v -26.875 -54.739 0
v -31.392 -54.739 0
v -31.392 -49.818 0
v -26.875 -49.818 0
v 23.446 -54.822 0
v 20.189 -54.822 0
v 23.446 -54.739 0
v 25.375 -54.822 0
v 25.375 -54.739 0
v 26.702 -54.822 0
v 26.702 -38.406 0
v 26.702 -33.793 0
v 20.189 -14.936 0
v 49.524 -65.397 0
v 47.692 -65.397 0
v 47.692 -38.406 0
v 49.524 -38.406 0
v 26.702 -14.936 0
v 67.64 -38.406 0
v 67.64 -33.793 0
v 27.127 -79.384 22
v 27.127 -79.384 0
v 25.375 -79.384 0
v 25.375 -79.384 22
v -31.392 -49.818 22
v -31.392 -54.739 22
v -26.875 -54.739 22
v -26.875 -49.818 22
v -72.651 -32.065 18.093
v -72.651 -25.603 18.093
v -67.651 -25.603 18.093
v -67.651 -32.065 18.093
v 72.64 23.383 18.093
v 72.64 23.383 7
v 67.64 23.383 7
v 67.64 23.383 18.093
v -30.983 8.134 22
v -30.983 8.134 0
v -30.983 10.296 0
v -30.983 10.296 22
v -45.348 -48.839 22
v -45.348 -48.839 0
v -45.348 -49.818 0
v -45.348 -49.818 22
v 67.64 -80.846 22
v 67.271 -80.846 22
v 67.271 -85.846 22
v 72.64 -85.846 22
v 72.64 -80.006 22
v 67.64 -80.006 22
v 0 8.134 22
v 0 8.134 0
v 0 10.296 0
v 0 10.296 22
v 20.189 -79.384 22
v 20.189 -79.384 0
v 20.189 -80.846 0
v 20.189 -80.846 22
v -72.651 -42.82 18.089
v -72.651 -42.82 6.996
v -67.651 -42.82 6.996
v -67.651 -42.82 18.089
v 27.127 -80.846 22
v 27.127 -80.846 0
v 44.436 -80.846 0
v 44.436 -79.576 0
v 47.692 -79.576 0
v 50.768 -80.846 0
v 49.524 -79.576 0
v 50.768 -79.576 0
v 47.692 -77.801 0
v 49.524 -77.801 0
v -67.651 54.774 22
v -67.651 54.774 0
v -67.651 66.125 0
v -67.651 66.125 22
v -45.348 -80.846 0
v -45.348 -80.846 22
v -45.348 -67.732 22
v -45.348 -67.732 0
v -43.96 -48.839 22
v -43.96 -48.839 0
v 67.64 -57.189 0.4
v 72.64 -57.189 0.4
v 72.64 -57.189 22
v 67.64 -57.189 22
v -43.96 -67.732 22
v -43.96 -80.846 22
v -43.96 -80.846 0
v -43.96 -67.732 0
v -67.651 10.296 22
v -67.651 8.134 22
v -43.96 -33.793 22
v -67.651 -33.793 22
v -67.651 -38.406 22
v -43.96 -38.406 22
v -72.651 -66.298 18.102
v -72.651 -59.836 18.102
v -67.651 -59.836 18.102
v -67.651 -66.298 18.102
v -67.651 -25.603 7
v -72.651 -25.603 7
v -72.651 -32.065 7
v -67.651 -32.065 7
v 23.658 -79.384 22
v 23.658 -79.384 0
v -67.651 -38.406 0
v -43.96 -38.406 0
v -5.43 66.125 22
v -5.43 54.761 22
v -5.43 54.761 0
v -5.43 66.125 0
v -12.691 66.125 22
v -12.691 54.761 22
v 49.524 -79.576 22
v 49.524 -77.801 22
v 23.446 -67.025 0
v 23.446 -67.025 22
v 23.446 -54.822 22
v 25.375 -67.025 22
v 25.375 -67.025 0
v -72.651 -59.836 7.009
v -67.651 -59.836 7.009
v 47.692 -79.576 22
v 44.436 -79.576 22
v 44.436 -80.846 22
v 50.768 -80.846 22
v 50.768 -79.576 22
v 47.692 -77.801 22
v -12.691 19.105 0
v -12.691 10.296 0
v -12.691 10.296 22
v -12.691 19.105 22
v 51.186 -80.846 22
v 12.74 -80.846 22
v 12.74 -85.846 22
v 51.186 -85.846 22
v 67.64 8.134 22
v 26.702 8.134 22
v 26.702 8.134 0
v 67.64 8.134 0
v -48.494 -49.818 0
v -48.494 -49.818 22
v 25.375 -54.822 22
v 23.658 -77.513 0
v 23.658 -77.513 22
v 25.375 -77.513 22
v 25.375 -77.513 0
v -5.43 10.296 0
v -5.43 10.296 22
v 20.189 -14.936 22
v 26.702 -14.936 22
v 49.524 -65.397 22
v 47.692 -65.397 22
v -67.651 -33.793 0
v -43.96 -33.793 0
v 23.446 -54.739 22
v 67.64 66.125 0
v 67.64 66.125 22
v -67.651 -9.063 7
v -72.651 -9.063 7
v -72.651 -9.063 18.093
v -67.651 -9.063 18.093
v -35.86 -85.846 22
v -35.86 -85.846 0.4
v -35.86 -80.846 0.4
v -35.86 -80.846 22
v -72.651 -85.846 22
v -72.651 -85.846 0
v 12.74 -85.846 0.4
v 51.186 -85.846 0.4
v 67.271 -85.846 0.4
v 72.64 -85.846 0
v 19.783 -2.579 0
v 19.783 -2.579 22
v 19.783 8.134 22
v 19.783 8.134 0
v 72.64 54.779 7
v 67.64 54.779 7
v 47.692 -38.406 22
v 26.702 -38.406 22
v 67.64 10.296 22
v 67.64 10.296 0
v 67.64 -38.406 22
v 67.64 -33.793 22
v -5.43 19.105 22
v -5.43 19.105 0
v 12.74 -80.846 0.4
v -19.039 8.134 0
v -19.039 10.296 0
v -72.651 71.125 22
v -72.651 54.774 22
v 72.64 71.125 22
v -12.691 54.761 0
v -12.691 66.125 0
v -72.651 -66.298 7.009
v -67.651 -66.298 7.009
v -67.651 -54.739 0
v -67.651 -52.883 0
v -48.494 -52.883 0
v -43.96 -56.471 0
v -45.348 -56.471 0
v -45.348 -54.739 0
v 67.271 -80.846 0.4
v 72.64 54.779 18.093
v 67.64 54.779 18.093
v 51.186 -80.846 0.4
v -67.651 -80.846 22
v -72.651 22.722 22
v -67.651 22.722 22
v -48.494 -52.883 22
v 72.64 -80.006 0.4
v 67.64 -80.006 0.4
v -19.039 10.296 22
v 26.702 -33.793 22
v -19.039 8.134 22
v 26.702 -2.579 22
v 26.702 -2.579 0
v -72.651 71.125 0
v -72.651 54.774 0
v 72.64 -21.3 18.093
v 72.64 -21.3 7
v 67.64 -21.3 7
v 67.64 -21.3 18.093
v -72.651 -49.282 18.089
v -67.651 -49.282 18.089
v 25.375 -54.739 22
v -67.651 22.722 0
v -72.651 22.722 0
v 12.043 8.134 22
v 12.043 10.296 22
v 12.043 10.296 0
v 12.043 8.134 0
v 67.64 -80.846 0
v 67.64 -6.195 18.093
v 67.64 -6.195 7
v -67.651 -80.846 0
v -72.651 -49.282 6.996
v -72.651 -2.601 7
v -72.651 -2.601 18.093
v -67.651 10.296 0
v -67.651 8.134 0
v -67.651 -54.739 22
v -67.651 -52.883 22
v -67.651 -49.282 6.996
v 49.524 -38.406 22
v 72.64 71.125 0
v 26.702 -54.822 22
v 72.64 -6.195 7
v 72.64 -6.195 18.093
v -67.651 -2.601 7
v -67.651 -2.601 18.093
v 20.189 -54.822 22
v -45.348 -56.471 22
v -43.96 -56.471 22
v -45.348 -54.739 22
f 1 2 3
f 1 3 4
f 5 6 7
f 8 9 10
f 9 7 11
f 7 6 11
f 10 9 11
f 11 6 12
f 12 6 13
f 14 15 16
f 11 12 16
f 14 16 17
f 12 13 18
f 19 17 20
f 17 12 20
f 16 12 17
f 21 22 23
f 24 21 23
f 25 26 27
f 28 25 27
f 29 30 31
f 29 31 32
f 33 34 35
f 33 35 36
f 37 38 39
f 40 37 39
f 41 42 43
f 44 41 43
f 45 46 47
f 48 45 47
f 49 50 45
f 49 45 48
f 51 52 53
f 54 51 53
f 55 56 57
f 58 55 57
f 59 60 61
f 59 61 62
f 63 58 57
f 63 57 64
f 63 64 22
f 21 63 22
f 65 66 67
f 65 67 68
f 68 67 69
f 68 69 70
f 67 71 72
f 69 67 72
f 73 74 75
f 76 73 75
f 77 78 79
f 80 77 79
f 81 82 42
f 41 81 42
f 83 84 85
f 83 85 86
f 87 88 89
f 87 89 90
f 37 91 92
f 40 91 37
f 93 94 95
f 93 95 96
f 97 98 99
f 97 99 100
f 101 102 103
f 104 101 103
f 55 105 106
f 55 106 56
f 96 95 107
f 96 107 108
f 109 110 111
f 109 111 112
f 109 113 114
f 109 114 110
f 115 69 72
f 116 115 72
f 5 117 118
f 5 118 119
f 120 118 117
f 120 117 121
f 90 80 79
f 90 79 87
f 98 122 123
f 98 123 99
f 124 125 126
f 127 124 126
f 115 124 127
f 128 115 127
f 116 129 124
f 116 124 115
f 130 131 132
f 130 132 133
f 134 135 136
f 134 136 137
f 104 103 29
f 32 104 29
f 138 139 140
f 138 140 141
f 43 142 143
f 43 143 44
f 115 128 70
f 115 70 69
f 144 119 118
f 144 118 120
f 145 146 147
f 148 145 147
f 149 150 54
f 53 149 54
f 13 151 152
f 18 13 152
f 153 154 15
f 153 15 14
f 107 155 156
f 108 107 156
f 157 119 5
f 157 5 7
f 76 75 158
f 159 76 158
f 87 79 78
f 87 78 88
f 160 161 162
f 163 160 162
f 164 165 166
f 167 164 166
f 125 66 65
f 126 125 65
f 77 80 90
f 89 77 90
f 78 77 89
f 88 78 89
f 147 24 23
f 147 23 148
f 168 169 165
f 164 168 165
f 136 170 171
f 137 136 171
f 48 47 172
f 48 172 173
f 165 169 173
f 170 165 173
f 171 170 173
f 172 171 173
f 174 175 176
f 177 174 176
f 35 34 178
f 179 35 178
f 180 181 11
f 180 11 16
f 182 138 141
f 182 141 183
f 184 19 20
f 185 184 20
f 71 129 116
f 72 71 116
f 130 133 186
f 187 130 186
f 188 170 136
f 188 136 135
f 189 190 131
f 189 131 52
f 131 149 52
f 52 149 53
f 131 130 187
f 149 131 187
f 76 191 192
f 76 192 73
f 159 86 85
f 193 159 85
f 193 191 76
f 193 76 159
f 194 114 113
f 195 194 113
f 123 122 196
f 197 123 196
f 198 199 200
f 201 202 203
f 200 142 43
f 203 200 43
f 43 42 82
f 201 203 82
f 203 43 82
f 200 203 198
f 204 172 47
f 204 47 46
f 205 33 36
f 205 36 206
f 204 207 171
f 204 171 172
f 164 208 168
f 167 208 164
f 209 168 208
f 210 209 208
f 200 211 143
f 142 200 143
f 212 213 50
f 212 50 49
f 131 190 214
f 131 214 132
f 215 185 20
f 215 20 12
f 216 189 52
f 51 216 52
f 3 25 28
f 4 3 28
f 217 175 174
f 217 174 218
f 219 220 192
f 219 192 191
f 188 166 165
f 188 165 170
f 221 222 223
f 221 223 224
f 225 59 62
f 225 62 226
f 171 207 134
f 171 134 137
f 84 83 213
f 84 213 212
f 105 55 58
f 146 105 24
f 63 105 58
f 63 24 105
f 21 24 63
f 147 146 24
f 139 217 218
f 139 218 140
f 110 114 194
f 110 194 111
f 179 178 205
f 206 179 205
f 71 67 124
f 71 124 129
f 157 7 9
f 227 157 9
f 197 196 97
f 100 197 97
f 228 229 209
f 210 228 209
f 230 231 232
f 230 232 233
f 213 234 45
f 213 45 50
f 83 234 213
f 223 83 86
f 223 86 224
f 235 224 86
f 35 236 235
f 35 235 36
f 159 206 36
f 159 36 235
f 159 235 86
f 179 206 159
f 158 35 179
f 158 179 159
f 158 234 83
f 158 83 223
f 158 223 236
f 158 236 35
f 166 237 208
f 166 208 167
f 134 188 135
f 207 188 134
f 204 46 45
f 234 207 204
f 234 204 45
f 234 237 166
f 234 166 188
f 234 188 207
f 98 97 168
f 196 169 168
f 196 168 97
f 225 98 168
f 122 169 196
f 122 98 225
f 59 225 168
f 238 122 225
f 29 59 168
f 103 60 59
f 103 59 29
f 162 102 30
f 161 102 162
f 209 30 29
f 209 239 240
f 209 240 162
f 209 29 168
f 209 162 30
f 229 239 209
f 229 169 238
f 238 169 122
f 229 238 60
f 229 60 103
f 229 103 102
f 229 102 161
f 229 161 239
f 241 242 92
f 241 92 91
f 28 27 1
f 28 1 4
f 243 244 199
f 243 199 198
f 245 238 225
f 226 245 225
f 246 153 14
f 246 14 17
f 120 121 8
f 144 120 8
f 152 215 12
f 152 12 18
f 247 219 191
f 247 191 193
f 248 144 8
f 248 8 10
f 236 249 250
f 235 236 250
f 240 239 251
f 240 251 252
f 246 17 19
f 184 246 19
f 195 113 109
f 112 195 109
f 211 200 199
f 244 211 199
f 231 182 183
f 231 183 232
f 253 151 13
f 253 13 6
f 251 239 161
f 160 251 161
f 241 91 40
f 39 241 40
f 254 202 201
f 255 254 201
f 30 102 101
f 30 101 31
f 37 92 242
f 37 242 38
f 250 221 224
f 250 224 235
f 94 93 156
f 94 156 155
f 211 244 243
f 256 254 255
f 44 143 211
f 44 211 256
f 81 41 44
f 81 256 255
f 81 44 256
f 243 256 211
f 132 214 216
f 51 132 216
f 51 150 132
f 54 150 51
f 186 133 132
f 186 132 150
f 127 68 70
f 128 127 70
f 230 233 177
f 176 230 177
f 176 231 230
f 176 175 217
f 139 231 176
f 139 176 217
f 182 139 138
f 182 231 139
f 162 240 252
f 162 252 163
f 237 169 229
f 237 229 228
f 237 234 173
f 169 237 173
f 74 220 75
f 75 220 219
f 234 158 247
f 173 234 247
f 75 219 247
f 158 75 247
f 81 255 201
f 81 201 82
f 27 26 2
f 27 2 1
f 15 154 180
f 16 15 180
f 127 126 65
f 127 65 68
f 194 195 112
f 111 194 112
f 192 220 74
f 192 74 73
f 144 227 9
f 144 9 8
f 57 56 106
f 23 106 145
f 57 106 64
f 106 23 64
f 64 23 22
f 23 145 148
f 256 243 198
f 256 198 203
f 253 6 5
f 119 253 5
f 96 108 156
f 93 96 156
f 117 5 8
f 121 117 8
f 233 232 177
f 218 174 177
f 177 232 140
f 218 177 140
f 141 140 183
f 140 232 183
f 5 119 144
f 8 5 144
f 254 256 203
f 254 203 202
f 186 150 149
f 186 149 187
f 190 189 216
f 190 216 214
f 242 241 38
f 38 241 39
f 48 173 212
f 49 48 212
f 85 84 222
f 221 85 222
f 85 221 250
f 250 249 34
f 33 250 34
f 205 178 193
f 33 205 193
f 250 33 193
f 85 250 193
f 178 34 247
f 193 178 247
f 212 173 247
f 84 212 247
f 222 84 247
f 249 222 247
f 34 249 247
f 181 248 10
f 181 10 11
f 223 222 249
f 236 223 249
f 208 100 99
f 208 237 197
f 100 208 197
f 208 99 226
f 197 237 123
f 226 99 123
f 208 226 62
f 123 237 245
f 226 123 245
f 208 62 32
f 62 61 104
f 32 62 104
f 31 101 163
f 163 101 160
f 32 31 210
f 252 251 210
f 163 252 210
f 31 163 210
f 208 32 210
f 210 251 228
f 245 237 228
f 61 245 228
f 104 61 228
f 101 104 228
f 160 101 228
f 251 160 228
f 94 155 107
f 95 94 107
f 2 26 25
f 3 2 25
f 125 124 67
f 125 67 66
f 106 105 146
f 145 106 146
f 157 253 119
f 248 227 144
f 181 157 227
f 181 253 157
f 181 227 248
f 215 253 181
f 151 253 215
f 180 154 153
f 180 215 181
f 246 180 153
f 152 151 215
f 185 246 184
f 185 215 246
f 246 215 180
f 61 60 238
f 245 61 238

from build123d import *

# Parameters (mm, degrees)
F0_W      = 145.290799439
F0_H      = 156.9714471698
F0_W_2    = 135.290799439
F0_H_2    = 146.9714471698
F1_DEPTH  = 22
F3_DEPTH  = 22
F2_W      = 7.2601954453
F2_H      = 8.8090933859
F2_W_2    = 6.3487580046
F2_H_2    = 2.1618660539
F2_W_3    = 5.4304315709
F2_H_3    = 11.3644477725
F2_W_4    = 6.5120756626
F2_H_4    = 18.8578870147
F2_H_5    = 4.6127215028
F2_W_5    = 1.8315203488
F2_H_6    = 26.9907303154
F2_W_6    = 3.1460821629
F2_H_7    = 3.0654147267
F2_W_7    = 1.3877488673
F2_H_8    = 13.1146934628
F2_W_8    = 4.5174527913
F2_H_9    = 4.9207955599
F2_W_9    = 36.6682809591
F2_W_10   = 6.9186799228
F2_H_10   = 10.7129600365
F2_W_11   = 1.7163297161
F2_H_11   = 1.8706470728
F2_W_12   = 1.9290503114
F2_H_12   = 12.2028924525
F2_H_13   = 1.7747357488
F5_W      = 32.0514254272
F5_H      = 22
F5_W_2    = 6.4619807526
F5_H_2    = 11.0930625647
F6_DEPTH  = 8.3
F7_W      = 15.1057243347
F7_H      = 11.0930625647
F7_W_2    = 31.3963359222
F8_DEPTH  = 9.5
F9_W      = 48.5993335024
F9_H      = 5.9323087335
F9_W_2    = 5.9323124588
F9_H_2    = 0.1140758395
F10_DEPTH = 21.6


with BuildPart() as f1:
    # F0 (on Top) → F1 (new body)
    with BuildSketch(Plane.XY):
        with Locations((-0.0057928264, -7.3606334627)):
            Rectangle(F0_W, F0_H)
        with Locations((-0.0057928264, -7.3606334627)):
            Rectangle(F0_W_2, F0_H_2, mode=Mode.SUBTRACT)
    extrude(amount=F1_DEPTH)

    # F5 (on face) → F6 (cut)
    with BuildSketch(Plane(origin=(-72.6511925459, 0, 0), x_dir=(0, -1, 0), z_dir=(-1, 0, 0))):
        with Locations((-38.7480873615, 11)):
            Rectangle(F5_W, F5_H)
        with Locations((5.8316993527, 12.5465312824)):
            Rectangle(F5_W_2, F5_H_2)
        with Locations((28.8336998783, 12.5465312824)):
            Rectangle(F5_W_2, F5_H_2)
        with Locations((46.0508055985, 12.542069209)):
            Rectangle(F5_W_2, F5_H_2)
        with Locations((63.066707924, 12.555777346)):
            Rectangle(F5_W_2, F5_H_2)
    extrude(amount=-F6_DEPTH, mode=Mode.SUBTRACT)

    # F7 (on face) → F8 (cut)
    with BuildSketch(Plane.YZ.offset(72.6396068931)):
        with Locations((-13.7475095689, 12.5465312824)):
            Rectangle(F7_W, F7_H)
        with Locations((39.0812777914, 12.5465312824)):
            Rectangle(F7_W_2, F7_H)
    extrude(amount=-F8_DEPTH, mode=Mode.SUBTRACT)

    # F9 (on face) → F10 (cut)
    with BuildSketch(Plane.XY.offset(22)):
        with Locations((-11.5599553101, -83.5425294936)):
            Rectangle(F9_W, F9_H)
        Polygon((61.3390468061, -79.8918753862), (51.1856637895, -79.8918753862), (51.1856637895, -87.4213501811), (67.2713592649, -87.4213501811), (67.2713592649, -80.0059512258), (61.3390468061, -80.0059512258), align=None)
        Polygon((61.3390468061, -57.1893677115), (61.3390468061, -79.8918753862), (67.2713592649, -79.8918753862), (67.2713592649, -80.0059512258), (75.4853338003, -80.0059512258), (75.4853338003, -57.1893677115), align=None)
        with Locations((64.3052030355, -79.948913306)):
            Rectangle(F9_W_2, F9_H_2)
    extrude(amount=-F10_DEPTH, mode=Mode.SUBTRACT)


with BuildPart() as f3:
    # F2 (on face) → F3 (new body)
    with BuildSketch(Plane.XY.offset(22)):
        Polygon((-46.0593439639, -33.7934084237), (-67.6511925459, -33.7934084237), (-67.6511925459, -38.4061299264), (-45.348033309, -38.4061299264), (-43.9602844417, -38.4061299264), (-43.9602844417, -33.7934084237), align=None)
    extrude(amount=-F3_DEPTH)


with BuildPart() as f3b:
    # F2 (on face) → F3, piece 2 (new body)
    with BuildSketch(Plane.XY.offset(22)):
        with Locations((-9.0605292935, 14.7004760802)):
            Rectangle(F2_W, F2_H)
        with Locations((-15.8650060184, 9.2149963602)):
            Rectangle(F2_W_2, F2_H_2)
        with Locations((-9.0605292935, 9.2149963602)):
            Rectangle(F2_W, F2_H_2)
        with Locations((-2.7152157854, 9.2149963602)):
            Rectangle(F2_W_3, F2_H_2)
    extrude(amount=-F3_DEPTH)


with BuildPart() as f3c:
    # F2 (on face) → F3, piece 3 (new body)
    with BuildSketch(Plane.XY.offset(22)):
        with Locations((-9.0605292935, 60.442866236)):
            Rectangle(F2_W, F2_H_3)
    extrude(amount=-F3_DEPTH)


with BuildPart() as f3d:
    # F2 (on face) → F3, piece 4 (new body)
    with BuildSketch(Plane.XY.offset(22)):
        with Locations((23.4455168247, -24.3644649163)):
            Rectangle(F2_W_4, F2_H_4)
        with Locations((23.4455168247, -36.0997691751)):
            Rectangle(F2_W_4, F2_H_5)
        Polygon((26.701554656, -38.4061299264), (20.1894789934, -38.4061299264), (20.1894789934, -54.8219867051), (23.4455168247, -54.8219867051), (23.4455168247, -54.7385849059), (25.3745671362, -54.7385849059), (25.3745671362, -54.8219867051), (26.701554656, -54.8219867051), align=None)
        Polygon((67.6396068931, -33.7934084237), (26.701554656, -33.7934084237), (26.701554656, -38.4061299264), (47.6919971406, -38.4061299264), (49.5235174894, -38.4061299264), (67.6396068931, -38.4061299264), align=None)
        with Locations((48.607757315, -51.9014950842)):
            Rectangle(F2_W_5, F2_H_6)
    extrude(amount=-F3_DEPTH)


with BuildPart() as f3e:
    # F2 (on face) → F3, piece 5 (new body)
    with BuildSketch(Plane.XY.offset(22)):
        with Locations((-46.9210743904, -51.3504967093)):
            Rectangle(F2_W_6, F2_H_7)
        Polygon((-43.9602844417, -48.8392449915), (-45.348033309, -48.8392449915), (-45.348033309, -49.817789346), (-45.348033309, -52.8832040727), (-45.348033309, -54.7385849059), (-45.348033309, -56.4711987972), (-43.9602844417, -56.4711987972), align=None)
        Polygon((-48.4941154718, -52.8832040727), (-67.6511925459, -52.8832040727), (-67.6511925459, -54.7385849059), (-45.348033309, -54.7385849059), (-45.348033309, -52.8832040727), align=None)
    extrude(amount=-F3_DEPTH)


with BuildPart() as f3f:
    # F2 (on face) → F3, piece 6 (new body)
    with BuildSketch(Plane.XY.offset(22)):
        with Locations((-44.6541588753, -74.2890103161)):
            Rectangle(F2_W_7, F2_H_8)
    extrude(amount=-F3_DEPTH)


with BuildPart() as f3g:
    # F2 (on face) → F3, piece 7 (new body)
    with BuildSketch(Plane.XY.offset(22)):
        with Locations((-29.1335983202, -52.2781871259)):
            Rectangle(F2_W_8, F2_H_9)
    extrude(amount=-F3_DEPTH)


with BuildPart() as f3h:
    # F2 (on face) → F3, piece 8 (new body)
    with BuildSketch(Plane.XY.offset(22)):
        with Locations((-49.3170520663, 9.2149963602)):
            Rectangle(F2_W_9, F2_H_2)
    extrude(amount=-F3_DEPTH)


with BuildPart() as f3i:
    # F2 (on face) → F3, piece 9 (new body)
    with BuildSketch(Plane.XY.offset(22)):
        Polygon((26.701554656, 8.1340633333), (67.6396068931, 8.1340633333), (67.6396068931, 10.2959293872), (12.0425643399, 10.2959293872), (12.0425643399, 8.1340633333), (19.7828747332, 8.1340633333), align=None)
        with Locations((23.2422146946, 2.777583315)):
            Rectangle(F2_W_10, F2_H_10)
    extrude(amount=-F3_DEPTH)


with BuildPart() as f3j:
    # F2 (on face) → F3, piece 10 (new body)
    with BuildSketch(Plane.XY.offset(22)):
        Polygon((20.1894789934, -79.3837159872), (20.1894789934, -80.8463570476), (27.1269958466, -80.8463570476), (27.1269958466, -79.3837159872), (25.3745671362, -79.3837159872), (23.65823742, -79.3837159872), align=None)
        with Locations((24.5164022781, -78.4483924508)):
            Rectangle(F2_W_11, F2_H_11)
    extrude(amount=-F3_DEPTH)


with BuildPart() as f3k:
    # F2 (on face) → F3, piece 11 (new body)
    with BuildSketch(Plane.XY.offset(22)):
        with Locations((24.4100419804, -60.9234329313)):
            Rectangle(F2_W_12, F2_H_12)
    extrude(amount=-F3_DEPTH)


with BuildPart() as f3l:
    # F2 (on face) → F3, piece 12 (new body)
    with BuildSketch(Plane.XY.offset(22)):
        with Locations((48.607757315, -78.6882378161)):
            Rectangle(F2_W_5, F2_H_13)
        Polygon((44.4364733994, -80.8463570476), (50.767980516, -80.8463570476), (50.767980516, -79.5756056905), (49.5235174894, -79.5756056905), (47.6919971406, -79.5756056905), (44.4364733994, -79.5756056905), align=None)
    extrude(amount=-F3_DEPTH)


solid = Compound([f1.part, f3.part, f3b.part, f3c.part, f3d.part, f3e.part, f3f.part, f3g.part, f3h.part, f3i.part, f3j.part, f3k.part, f3l.part])
